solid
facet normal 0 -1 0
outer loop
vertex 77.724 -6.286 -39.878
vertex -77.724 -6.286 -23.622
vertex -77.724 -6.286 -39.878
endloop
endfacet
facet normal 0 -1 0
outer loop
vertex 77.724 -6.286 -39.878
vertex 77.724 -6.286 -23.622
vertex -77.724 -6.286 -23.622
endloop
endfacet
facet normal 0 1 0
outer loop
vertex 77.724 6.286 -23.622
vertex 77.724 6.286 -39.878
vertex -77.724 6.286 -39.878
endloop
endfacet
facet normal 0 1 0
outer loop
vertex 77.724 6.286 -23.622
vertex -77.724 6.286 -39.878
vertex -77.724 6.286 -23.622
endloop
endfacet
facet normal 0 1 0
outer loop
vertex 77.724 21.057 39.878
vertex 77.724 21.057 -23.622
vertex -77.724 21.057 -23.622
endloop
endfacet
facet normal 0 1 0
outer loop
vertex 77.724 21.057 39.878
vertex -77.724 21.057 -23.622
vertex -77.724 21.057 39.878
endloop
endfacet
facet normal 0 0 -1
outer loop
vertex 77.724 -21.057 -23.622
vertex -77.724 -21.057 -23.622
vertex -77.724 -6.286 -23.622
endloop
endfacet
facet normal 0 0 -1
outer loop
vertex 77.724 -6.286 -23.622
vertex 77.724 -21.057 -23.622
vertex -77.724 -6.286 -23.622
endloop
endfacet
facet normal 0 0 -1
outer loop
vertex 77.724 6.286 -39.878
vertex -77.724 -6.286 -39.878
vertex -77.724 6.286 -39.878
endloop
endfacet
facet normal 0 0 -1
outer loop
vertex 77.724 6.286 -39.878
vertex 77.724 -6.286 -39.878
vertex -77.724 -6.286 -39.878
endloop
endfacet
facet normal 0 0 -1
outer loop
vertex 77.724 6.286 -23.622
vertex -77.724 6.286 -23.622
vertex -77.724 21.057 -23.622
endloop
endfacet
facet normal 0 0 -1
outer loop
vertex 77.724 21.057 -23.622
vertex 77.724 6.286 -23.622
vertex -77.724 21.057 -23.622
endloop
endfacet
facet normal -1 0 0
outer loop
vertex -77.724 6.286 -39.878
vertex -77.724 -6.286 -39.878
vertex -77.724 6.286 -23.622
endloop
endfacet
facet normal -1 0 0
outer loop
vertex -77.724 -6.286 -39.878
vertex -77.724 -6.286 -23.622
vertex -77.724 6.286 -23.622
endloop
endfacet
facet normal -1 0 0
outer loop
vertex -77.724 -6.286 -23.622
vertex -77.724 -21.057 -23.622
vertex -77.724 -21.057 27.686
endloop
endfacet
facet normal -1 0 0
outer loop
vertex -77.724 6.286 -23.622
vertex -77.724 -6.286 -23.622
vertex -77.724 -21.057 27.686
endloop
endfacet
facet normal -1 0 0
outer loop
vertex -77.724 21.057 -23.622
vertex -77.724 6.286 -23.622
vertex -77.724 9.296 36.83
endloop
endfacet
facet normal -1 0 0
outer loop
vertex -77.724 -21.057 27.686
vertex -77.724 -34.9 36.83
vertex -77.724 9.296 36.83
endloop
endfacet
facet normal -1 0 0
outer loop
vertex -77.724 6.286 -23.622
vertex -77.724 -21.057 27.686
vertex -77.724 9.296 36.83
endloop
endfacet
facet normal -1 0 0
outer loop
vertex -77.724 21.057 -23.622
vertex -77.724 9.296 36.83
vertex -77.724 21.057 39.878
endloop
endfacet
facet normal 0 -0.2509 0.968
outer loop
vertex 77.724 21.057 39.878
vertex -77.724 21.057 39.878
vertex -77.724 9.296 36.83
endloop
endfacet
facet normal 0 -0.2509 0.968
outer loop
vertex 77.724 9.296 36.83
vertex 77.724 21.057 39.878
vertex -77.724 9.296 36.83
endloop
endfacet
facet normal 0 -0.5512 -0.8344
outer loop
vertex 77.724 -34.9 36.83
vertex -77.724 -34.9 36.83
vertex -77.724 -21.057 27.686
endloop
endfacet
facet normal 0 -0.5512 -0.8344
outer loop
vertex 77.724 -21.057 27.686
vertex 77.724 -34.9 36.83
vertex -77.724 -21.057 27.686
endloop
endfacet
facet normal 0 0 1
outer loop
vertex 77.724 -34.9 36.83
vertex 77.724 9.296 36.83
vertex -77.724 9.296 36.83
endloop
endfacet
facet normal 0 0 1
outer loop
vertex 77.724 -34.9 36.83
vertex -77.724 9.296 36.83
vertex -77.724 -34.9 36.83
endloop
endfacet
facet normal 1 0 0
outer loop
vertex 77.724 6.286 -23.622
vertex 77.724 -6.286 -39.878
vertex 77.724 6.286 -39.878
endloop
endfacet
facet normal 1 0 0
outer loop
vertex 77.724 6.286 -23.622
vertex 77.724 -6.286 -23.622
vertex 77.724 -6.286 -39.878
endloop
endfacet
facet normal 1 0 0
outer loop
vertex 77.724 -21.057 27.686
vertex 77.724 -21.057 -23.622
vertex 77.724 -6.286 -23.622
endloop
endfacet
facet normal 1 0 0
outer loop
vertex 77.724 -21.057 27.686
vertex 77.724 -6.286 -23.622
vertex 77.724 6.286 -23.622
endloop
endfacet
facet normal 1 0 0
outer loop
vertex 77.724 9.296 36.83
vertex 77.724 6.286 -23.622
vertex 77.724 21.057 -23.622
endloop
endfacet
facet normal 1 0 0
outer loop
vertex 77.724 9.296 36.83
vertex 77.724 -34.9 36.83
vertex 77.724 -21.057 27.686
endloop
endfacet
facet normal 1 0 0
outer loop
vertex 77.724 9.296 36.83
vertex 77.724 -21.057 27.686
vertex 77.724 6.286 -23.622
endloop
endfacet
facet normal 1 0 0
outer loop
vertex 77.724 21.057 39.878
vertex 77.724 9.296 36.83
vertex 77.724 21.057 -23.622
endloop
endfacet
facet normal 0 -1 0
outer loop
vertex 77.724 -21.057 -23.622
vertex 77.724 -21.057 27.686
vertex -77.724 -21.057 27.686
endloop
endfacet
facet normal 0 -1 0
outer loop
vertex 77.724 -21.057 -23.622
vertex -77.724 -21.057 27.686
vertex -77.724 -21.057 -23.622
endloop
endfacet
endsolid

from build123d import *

# Parameters (mm, degrees)
F1_DEPTH = 77.724


with BuildPart() as f1:
    # F0 (on Right) → F1 (new body, symmetric)
    with BuildSketch(Plane.YZ):
        Polygon((-6.2865, -39.878), (6.2865, -39.878), (6.2865, -23.622), (21.0566, -23.622), (21.0566, 36.83), (21.0566, 39.878), (9.2964, 36.83), (-34.8996, 36.83), (-21.0566, 27.686), (-21.0566, -23.622), (-6.2865, -23.622), align=None)
    extrude(amount=F1_DEPTH, both=True)


solid = f1.part
